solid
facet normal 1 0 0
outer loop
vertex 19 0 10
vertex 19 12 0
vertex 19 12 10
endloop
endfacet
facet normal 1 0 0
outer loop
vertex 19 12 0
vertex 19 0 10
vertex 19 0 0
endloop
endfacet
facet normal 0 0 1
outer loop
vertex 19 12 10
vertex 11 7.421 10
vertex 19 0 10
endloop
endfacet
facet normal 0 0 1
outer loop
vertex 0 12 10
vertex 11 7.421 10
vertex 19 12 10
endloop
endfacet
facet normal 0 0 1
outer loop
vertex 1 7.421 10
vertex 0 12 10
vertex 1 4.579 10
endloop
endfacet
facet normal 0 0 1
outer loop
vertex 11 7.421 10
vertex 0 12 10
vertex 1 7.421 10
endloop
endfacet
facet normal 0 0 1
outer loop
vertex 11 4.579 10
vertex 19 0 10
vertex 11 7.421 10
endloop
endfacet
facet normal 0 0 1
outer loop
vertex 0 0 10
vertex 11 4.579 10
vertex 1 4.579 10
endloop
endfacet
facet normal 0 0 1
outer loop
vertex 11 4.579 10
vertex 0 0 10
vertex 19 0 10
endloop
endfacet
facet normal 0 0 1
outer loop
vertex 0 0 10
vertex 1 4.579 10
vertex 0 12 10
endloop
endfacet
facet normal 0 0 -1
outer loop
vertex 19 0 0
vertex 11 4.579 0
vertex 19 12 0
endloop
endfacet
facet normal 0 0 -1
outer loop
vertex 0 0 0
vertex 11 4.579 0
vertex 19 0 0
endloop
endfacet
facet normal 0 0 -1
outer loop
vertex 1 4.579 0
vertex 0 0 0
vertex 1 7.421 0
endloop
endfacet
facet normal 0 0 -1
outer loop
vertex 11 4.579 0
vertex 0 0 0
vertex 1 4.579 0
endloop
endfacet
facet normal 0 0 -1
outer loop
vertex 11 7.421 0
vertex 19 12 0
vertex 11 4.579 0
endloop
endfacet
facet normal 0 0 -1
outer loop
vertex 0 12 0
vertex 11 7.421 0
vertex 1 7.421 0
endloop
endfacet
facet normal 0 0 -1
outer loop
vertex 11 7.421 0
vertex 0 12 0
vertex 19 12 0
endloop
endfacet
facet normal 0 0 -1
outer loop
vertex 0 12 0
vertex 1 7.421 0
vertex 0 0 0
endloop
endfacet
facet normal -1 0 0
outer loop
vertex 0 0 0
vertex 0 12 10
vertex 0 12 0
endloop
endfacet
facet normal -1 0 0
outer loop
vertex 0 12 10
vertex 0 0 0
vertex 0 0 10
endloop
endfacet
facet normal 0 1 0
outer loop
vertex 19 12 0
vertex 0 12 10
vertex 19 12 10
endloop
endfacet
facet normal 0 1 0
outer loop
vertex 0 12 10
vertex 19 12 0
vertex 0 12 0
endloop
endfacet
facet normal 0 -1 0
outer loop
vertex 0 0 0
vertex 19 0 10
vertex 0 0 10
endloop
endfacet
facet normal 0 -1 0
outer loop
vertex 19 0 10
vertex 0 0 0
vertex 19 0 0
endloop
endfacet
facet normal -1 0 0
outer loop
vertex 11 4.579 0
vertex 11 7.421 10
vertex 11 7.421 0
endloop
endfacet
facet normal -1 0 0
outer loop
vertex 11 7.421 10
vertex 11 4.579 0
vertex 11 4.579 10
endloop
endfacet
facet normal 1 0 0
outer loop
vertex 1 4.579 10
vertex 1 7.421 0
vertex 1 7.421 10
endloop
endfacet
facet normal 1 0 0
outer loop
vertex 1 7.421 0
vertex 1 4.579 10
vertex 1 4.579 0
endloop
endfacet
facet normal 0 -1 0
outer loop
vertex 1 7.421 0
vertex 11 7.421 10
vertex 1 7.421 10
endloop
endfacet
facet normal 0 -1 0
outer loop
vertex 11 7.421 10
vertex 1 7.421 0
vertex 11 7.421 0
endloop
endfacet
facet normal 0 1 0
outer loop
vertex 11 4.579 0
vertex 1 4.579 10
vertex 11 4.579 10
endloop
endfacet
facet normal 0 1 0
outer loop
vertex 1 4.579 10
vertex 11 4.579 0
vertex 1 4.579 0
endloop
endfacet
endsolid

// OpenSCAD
// file: ../../chain-loop.scad
module chainLoop(cutoutAxis = "x",
				 xLength = 19,
				 xPercentage = 1.0,
                 yLength = 12,
                 yPercentage = 0.75,
                 zLength = 10,
                 zPercentage = 0.65)
{
    difference()
    {
        color("green")
        cube([xLength, yLength, zLength]);
        cutout(cutoutAxis,
				xLength,
				xPercentage,
				yLength,
				yPercentage,
				zLength,
				zPercentage);
    }
}

/**
 * This module takes the cubic lengths of the chain loop and calculates the
 * dimensions of the cot out protion based on the percentages given.
 *
 * The percentages are expected to be of type float with 1 being 100%.
 */
module cutout(cutoutAxis = "x",
			  xLength,
			  xPercentage = 1.0,
              yLength,
              yPercentage,
              zLength,
              zPercentage
        )
{


	if(cutoutAxis == "x")
	{
		zCutoutLength = zLength * zPercentage;
	    zTranslate = (zLength/2.0) - (zCutoutLength / 2.0);

	    yCutoutLength = yLength * yPercentage;

	    yTranslate = (yLength / 2.0) - (yCutoutLength / 2.0);

	    translate([-1, yTranslate, zTranslate])
	    cube([xLength+3, yCutoutLength, zCutoutLength]);
	}
	else if(cutoutAxis == "z")
	{
		zCutoutLength = zLength * zPercentage;
	    zTranslate = (zLength/2.0) - (zCutoutLength / 2.0);

	    yCutoutLength = yLength * yPercentage;

	    yTranslate = (yLength / 2.0) - (yCutoutLength / 2.0);


		xCoutoutLength = zLength * xPercentage;
		xTranslate = 01;
//		yTranslate = 2;

		translate([xTranslate, yTranslate, -1])
	    cube([xCoutoutLength, yCutoutLength, zLength+3]);
	}
}
// main file
use <../../chain-loop.scad>

color("orange")
translate([0, 0, 0])
chainLoop(cutoutAxis = "z",
		  yPercentage = 0.2368,
          zPercentage = 0.4319);
